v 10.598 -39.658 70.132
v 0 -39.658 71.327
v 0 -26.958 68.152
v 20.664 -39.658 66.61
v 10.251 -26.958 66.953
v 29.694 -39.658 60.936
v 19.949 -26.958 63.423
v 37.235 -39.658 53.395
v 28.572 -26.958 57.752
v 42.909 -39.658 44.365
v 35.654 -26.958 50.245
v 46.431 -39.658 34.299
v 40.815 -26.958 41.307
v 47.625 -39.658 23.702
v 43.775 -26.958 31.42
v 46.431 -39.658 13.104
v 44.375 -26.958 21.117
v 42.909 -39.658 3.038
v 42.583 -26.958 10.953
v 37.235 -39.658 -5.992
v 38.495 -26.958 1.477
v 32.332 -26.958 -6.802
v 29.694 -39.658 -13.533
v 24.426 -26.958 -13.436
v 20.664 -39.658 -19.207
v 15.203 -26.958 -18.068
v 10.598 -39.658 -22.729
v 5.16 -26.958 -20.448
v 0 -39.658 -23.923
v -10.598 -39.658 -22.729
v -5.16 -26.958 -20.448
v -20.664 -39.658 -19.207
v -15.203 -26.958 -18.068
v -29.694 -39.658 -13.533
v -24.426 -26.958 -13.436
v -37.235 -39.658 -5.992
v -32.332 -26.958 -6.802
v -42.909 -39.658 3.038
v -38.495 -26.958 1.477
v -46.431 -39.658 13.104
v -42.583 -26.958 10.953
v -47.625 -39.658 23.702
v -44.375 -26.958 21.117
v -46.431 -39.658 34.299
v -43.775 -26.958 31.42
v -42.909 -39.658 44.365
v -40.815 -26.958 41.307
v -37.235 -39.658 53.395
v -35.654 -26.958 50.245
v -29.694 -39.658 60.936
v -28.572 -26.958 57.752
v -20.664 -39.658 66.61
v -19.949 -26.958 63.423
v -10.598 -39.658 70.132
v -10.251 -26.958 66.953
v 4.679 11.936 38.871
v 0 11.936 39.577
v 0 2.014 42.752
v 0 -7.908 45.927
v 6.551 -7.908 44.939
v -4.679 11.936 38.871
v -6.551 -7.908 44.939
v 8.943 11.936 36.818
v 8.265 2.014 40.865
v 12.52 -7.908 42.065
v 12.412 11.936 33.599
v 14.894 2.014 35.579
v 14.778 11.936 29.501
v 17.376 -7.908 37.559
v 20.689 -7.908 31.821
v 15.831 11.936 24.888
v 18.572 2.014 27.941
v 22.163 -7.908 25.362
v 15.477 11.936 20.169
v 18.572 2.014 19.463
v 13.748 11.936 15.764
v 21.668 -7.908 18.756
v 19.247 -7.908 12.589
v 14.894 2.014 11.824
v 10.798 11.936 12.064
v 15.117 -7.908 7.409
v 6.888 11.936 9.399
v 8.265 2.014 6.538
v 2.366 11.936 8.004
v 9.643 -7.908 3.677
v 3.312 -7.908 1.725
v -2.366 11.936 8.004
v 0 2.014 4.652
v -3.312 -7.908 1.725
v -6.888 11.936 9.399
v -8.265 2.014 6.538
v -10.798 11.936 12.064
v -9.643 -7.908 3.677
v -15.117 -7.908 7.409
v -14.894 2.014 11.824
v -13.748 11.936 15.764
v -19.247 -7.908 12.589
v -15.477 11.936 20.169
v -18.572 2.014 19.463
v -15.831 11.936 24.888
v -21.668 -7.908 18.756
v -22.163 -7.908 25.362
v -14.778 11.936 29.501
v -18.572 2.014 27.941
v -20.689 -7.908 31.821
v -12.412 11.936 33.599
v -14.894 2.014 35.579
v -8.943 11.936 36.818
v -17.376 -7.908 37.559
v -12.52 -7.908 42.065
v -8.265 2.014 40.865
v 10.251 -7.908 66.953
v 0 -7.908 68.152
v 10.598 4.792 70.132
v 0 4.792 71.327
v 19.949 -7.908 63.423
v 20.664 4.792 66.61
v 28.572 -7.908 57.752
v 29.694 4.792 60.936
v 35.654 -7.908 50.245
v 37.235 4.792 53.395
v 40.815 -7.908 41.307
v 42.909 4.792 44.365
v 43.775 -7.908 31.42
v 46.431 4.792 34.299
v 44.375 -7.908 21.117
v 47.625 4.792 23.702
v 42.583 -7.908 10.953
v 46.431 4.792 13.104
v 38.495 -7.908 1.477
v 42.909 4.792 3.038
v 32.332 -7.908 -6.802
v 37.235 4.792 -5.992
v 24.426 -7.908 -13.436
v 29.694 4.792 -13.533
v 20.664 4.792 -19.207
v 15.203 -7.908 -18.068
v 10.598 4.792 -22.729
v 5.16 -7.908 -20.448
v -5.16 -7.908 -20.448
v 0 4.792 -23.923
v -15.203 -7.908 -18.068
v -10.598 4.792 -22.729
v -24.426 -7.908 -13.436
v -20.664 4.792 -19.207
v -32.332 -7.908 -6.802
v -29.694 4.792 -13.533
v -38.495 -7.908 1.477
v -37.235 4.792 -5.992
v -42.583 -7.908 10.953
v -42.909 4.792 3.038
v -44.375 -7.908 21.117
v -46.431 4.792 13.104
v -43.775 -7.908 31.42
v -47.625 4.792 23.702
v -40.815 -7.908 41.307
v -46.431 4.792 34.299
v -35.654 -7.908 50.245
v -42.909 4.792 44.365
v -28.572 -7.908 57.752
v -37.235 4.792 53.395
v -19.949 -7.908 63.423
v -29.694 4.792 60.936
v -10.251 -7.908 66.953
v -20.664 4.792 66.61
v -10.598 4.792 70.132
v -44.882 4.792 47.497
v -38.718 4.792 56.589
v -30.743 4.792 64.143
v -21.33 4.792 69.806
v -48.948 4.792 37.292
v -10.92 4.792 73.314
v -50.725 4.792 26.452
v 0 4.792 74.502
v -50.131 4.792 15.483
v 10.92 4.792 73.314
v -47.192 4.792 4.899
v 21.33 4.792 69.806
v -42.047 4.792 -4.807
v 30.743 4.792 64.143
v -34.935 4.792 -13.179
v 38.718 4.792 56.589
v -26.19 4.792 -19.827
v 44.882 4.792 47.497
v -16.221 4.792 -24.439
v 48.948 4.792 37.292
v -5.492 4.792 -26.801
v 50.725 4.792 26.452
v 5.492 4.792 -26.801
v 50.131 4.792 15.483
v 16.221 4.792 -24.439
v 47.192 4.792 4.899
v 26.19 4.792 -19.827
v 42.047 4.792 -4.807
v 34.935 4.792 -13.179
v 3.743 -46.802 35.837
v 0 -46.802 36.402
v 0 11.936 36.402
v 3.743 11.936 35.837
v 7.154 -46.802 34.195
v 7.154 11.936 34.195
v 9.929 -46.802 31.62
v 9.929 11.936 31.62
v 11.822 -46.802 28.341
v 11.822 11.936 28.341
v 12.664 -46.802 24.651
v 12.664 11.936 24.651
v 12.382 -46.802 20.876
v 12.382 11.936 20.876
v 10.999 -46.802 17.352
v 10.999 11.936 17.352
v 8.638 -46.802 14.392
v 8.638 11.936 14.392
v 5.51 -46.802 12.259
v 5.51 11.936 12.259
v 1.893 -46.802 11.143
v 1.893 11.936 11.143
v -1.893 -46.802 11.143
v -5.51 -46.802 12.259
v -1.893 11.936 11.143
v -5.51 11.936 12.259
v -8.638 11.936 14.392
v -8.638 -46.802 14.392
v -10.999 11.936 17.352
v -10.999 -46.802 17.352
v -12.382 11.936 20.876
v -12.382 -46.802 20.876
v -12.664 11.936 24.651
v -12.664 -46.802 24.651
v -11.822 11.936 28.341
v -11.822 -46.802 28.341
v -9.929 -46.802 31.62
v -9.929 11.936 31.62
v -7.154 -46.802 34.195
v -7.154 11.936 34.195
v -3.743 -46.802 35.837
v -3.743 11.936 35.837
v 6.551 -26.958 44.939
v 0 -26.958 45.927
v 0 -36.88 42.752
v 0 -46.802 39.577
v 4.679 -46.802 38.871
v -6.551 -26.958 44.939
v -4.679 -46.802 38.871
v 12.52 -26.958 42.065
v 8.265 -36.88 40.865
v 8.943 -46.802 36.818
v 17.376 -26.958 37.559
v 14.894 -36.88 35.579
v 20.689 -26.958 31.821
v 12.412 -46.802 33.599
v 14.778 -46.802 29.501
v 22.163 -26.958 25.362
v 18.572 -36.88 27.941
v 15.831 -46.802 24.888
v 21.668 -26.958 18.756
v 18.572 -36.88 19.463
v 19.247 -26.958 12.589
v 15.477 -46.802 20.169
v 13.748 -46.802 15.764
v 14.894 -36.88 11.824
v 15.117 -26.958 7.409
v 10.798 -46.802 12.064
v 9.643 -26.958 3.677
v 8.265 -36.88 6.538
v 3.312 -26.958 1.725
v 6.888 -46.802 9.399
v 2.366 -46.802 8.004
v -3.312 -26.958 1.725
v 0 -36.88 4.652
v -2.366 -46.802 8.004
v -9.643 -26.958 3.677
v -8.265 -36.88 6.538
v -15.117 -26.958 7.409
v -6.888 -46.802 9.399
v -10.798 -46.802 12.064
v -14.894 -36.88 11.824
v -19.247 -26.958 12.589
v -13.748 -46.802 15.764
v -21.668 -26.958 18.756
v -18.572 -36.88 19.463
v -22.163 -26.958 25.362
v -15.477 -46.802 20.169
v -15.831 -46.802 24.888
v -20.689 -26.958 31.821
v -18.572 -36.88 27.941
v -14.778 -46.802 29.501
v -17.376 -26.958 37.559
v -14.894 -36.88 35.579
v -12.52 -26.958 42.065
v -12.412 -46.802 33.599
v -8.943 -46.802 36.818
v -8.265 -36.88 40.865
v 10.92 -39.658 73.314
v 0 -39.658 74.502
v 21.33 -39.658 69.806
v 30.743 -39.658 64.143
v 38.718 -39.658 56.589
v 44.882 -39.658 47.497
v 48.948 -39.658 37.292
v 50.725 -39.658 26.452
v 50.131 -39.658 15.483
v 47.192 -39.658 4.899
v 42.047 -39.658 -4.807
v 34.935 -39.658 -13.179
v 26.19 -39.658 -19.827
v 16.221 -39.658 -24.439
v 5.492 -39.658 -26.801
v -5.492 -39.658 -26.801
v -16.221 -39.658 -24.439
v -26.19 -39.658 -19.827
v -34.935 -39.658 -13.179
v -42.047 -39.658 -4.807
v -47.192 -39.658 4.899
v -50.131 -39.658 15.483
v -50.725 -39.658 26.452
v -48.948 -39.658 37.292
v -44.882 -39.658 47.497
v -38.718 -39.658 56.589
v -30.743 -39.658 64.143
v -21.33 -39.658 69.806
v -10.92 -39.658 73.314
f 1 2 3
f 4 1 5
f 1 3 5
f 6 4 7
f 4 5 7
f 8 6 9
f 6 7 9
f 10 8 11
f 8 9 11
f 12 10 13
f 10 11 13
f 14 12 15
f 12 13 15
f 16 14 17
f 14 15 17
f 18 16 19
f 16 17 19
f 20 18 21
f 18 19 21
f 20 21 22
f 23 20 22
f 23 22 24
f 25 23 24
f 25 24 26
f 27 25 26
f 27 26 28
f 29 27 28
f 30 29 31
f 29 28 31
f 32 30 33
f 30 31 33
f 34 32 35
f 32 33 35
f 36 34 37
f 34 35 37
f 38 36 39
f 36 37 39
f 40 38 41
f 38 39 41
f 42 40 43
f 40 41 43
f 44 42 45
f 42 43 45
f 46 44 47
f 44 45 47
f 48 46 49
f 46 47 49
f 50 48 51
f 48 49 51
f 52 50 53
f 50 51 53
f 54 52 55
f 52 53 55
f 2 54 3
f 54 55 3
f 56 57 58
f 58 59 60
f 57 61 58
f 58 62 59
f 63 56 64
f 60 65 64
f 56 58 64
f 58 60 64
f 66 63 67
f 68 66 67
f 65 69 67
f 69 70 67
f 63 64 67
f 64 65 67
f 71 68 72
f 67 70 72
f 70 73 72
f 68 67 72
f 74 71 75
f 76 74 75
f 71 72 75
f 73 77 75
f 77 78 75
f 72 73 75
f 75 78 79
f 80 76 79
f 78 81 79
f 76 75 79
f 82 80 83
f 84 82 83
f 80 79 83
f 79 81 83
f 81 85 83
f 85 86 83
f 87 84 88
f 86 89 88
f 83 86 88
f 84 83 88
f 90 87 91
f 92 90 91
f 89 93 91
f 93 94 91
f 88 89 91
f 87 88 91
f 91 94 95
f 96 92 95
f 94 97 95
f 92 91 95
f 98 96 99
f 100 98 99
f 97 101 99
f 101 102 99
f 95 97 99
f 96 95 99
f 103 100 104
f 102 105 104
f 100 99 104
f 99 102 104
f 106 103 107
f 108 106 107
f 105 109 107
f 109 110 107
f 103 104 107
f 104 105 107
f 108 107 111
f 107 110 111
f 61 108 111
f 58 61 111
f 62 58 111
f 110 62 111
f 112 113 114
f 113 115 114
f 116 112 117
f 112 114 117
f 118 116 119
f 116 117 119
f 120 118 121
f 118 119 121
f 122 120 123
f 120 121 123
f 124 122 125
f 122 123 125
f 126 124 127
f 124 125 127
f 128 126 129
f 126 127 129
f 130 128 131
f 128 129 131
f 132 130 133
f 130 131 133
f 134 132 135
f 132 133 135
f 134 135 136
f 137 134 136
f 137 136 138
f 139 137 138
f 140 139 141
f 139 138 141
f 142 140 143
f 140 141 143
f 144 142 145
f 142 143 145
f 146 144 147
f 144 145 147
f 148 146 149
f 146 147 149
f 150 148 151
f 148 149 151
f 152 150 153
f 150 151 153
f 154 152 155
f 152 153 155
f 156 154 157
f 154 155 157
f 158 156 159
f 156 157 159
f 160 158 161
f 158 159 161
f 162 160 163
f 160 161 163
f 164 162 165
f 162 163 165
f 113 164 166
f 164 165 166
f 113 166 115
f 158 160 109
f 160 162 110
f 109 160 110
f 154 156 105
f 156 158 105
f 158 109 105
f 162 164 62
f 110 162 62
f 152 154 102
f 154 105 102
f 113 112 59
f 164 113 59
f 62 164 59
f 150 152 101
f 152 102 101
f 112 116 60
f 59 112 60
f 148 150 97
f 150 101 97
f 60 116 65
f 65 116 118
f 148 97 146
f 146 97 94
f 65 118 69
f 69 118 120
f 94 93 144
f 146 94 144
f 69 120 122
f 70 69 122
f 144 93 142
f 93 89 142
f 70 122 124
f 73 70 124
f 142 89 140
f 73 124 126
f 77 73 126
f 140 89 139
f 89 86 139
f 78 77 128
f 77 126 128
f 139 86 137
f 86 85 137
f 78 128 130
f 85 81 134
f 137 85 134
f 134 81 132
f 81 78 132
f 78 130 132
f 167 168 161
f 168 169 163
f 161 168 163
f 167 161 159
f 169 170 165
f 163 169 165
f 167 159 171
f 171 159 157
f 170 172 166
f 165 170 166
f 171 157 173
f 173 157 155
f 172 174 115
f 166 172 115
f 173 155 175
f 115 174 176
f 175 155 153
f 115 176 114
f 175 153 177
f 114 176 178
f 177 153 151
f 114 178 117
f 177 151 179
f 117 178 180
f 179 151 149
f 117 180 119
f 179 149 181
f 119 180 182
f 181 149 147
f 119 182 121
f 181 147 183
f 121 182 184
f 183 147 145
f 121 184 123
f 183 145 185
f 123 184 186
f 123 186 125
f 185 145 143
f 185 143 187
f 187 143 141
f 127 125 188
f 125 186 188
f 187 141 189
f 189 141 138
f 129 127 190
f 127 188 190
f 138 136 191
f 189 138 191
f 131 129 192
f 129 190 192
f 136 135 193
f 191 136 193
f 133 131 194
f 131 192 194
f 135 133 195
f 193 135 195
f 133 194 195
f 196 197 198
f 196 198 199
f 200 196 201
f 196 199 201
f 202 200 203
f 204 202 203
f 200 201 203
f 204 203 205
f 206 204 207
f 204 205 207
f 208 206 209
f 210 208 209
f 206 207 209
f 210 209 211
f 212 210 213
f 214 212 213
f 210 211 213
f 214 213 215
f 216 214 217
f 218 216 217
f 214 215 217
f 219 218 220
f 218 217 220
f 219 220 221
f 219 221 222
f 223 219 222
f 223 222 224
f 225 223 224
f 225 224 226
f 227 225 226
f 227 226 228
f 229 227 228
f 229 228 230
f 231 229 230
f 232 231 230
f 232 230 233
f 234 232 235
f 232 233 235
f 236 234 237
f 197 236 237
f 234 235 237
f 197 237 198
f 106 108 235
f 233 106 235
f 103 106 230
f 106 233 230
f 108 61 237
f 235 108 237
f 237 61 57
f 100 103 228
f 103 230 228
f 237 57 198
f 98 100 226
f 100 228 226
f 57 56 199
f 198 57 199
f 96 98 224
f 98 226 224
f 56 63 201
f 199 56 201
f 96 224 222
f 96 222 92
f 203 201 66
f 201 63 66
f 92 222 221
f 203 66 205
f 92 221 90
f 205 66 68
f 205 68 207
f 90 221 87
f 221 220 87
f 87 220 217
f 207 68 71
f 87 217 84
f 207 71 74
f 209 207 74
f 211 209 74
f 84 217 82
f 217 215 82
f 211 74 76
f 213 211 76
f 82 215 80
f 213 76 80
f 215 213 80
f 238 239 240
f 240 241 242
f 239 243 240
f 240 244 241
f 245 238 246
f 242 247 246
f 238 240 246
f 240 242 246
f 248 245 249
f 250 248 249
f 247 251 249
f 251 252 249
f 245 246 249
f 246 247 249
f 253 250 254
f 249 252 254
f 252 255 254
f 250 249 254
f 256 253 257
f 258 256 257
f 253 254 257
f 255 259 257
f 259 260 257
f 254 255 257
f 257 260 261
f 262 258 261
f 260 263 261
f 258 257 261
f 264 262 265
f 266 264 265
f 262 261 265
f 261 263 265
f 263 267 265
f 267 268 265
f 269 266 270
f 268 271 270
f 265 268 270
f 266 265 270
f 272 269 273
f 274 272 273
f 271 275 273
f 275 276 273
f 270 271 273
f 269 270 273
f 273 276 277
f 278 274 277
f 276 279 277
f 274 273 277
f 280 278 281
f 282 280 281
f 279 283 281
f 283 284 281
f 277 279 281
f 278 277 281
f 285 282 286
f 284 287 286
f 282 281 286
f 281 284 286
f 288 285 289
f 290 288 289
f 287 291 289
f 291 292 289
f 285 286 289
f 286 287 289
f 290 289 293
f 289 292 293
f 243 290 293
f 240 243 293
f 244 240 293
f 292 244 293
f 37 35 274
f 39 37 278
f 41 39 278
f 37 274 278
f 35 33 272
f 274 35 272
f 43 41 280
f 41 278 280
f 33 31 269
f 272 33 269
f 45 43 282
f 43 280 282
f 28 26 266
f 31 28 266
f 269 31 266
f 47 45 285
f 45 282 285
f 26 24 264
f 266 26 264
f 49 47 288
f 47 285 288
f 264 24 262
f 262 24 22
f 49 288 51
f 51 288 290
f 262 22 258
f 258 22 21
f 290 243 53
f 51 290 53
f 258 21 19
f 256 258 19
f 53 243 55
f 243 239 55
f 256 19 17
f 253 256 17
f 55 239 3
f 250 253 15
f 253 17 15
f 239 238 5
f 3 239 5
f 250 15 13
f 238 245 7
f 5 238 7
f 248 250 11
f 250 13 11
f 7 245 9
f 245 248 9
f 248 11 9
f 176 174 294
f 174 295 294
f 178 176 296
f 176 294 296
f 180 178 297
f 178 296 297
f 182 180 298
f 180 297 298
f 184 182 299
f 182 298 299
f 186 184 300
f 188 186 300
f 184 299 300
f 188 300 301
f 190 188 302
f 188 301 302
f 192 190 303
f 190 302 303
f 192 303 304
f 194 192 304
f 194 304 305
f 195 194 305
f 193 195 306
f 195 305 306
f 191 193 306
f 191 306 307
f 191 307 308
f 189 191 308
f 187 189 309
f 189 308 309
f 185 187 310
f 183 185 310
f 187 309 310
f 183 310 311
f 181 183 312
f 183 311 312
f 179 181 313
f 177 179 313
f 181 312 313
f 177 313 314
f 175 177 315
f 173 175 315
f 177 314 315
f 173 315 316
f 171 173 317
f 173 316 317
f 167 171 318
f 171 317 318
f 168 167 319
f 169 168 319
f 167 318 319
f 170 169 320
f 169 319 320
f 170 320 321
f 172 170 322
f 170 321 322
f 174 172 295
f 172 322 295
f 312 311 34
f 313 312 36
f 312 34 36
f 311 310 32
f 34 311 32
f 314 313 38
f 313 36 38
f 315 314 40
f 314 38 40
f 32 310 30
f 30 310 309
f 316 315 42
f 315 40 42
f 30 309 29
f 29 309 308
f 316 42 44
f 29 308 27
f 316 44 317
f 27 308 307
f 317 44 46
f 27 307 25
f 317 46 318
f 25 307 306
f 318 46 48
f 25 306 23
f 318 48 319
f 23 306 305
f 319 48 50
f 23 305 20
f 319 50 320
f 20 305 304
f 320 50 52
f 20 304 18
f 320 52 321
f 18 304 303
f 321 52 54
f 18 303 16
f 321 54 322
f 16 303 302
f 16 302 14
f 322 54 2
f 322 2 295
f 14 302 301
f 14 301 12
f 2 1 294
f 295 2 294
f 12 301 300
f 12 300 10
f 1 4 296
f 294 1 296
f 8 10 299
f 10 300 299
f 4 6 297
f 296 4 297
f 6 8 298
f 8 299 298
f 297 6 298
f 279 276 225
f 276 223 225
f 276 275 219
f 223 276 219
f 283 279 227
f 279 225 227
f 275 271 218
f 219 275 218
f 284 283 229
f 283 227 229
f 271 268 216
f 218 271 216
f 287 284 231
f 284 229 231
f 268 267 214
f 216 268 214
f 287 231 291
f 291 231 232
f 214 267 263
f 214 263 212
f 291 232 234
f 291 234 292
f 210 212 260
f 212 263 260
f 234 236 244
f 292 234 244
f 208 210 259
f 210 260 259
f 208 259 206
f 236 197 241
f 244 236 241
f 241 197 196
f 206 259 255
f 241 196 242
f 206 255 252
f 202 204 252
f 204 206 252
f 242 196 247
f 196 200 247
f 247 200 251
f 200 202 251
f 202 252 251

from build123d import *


with BuildPart() as f1:
    # F0 (on Right) → F1 (revolve)
    with BuildSketch(Plane.YZ):
        Polygon((-46.801966, 39.576525), (-46.801966, 36.401525), (-26.958216, 36.401525), (-26.958216, 45.926525), align=None)
        Polygon((-26.958216, 45.926525), (-26.958216, 36.401525), (-7.908216, 36.401525), (-7.908216, 45.926525), (-7.908216, 68.151525), (-7.908216, 74.501525), (-17.433216, 74.501525), (-26.958216, 74.501525), (-26.958216, 68.151525), align=None)
        Polygon((-7.908216, 45.926525), (-7.908216, 36.401525), (11.935534, 36.401525), (11.935534, 39.576525), align=None)
        Polygon((-39.658216, 71.326525), (-26.958216, 68.151525), (-26.958216, 74.501525), (-39.658216, 74.501525), align=None)
        Polygon((-7.908216, 74.501525), (-7.908216, 68.151525), (4.791784, 71.326525), (4.791784, 74.501525), align=None)
    revolve(axis=Axis((0, 4.550466, 23.701525), (0, 1, 0)))


solid = f1.part
